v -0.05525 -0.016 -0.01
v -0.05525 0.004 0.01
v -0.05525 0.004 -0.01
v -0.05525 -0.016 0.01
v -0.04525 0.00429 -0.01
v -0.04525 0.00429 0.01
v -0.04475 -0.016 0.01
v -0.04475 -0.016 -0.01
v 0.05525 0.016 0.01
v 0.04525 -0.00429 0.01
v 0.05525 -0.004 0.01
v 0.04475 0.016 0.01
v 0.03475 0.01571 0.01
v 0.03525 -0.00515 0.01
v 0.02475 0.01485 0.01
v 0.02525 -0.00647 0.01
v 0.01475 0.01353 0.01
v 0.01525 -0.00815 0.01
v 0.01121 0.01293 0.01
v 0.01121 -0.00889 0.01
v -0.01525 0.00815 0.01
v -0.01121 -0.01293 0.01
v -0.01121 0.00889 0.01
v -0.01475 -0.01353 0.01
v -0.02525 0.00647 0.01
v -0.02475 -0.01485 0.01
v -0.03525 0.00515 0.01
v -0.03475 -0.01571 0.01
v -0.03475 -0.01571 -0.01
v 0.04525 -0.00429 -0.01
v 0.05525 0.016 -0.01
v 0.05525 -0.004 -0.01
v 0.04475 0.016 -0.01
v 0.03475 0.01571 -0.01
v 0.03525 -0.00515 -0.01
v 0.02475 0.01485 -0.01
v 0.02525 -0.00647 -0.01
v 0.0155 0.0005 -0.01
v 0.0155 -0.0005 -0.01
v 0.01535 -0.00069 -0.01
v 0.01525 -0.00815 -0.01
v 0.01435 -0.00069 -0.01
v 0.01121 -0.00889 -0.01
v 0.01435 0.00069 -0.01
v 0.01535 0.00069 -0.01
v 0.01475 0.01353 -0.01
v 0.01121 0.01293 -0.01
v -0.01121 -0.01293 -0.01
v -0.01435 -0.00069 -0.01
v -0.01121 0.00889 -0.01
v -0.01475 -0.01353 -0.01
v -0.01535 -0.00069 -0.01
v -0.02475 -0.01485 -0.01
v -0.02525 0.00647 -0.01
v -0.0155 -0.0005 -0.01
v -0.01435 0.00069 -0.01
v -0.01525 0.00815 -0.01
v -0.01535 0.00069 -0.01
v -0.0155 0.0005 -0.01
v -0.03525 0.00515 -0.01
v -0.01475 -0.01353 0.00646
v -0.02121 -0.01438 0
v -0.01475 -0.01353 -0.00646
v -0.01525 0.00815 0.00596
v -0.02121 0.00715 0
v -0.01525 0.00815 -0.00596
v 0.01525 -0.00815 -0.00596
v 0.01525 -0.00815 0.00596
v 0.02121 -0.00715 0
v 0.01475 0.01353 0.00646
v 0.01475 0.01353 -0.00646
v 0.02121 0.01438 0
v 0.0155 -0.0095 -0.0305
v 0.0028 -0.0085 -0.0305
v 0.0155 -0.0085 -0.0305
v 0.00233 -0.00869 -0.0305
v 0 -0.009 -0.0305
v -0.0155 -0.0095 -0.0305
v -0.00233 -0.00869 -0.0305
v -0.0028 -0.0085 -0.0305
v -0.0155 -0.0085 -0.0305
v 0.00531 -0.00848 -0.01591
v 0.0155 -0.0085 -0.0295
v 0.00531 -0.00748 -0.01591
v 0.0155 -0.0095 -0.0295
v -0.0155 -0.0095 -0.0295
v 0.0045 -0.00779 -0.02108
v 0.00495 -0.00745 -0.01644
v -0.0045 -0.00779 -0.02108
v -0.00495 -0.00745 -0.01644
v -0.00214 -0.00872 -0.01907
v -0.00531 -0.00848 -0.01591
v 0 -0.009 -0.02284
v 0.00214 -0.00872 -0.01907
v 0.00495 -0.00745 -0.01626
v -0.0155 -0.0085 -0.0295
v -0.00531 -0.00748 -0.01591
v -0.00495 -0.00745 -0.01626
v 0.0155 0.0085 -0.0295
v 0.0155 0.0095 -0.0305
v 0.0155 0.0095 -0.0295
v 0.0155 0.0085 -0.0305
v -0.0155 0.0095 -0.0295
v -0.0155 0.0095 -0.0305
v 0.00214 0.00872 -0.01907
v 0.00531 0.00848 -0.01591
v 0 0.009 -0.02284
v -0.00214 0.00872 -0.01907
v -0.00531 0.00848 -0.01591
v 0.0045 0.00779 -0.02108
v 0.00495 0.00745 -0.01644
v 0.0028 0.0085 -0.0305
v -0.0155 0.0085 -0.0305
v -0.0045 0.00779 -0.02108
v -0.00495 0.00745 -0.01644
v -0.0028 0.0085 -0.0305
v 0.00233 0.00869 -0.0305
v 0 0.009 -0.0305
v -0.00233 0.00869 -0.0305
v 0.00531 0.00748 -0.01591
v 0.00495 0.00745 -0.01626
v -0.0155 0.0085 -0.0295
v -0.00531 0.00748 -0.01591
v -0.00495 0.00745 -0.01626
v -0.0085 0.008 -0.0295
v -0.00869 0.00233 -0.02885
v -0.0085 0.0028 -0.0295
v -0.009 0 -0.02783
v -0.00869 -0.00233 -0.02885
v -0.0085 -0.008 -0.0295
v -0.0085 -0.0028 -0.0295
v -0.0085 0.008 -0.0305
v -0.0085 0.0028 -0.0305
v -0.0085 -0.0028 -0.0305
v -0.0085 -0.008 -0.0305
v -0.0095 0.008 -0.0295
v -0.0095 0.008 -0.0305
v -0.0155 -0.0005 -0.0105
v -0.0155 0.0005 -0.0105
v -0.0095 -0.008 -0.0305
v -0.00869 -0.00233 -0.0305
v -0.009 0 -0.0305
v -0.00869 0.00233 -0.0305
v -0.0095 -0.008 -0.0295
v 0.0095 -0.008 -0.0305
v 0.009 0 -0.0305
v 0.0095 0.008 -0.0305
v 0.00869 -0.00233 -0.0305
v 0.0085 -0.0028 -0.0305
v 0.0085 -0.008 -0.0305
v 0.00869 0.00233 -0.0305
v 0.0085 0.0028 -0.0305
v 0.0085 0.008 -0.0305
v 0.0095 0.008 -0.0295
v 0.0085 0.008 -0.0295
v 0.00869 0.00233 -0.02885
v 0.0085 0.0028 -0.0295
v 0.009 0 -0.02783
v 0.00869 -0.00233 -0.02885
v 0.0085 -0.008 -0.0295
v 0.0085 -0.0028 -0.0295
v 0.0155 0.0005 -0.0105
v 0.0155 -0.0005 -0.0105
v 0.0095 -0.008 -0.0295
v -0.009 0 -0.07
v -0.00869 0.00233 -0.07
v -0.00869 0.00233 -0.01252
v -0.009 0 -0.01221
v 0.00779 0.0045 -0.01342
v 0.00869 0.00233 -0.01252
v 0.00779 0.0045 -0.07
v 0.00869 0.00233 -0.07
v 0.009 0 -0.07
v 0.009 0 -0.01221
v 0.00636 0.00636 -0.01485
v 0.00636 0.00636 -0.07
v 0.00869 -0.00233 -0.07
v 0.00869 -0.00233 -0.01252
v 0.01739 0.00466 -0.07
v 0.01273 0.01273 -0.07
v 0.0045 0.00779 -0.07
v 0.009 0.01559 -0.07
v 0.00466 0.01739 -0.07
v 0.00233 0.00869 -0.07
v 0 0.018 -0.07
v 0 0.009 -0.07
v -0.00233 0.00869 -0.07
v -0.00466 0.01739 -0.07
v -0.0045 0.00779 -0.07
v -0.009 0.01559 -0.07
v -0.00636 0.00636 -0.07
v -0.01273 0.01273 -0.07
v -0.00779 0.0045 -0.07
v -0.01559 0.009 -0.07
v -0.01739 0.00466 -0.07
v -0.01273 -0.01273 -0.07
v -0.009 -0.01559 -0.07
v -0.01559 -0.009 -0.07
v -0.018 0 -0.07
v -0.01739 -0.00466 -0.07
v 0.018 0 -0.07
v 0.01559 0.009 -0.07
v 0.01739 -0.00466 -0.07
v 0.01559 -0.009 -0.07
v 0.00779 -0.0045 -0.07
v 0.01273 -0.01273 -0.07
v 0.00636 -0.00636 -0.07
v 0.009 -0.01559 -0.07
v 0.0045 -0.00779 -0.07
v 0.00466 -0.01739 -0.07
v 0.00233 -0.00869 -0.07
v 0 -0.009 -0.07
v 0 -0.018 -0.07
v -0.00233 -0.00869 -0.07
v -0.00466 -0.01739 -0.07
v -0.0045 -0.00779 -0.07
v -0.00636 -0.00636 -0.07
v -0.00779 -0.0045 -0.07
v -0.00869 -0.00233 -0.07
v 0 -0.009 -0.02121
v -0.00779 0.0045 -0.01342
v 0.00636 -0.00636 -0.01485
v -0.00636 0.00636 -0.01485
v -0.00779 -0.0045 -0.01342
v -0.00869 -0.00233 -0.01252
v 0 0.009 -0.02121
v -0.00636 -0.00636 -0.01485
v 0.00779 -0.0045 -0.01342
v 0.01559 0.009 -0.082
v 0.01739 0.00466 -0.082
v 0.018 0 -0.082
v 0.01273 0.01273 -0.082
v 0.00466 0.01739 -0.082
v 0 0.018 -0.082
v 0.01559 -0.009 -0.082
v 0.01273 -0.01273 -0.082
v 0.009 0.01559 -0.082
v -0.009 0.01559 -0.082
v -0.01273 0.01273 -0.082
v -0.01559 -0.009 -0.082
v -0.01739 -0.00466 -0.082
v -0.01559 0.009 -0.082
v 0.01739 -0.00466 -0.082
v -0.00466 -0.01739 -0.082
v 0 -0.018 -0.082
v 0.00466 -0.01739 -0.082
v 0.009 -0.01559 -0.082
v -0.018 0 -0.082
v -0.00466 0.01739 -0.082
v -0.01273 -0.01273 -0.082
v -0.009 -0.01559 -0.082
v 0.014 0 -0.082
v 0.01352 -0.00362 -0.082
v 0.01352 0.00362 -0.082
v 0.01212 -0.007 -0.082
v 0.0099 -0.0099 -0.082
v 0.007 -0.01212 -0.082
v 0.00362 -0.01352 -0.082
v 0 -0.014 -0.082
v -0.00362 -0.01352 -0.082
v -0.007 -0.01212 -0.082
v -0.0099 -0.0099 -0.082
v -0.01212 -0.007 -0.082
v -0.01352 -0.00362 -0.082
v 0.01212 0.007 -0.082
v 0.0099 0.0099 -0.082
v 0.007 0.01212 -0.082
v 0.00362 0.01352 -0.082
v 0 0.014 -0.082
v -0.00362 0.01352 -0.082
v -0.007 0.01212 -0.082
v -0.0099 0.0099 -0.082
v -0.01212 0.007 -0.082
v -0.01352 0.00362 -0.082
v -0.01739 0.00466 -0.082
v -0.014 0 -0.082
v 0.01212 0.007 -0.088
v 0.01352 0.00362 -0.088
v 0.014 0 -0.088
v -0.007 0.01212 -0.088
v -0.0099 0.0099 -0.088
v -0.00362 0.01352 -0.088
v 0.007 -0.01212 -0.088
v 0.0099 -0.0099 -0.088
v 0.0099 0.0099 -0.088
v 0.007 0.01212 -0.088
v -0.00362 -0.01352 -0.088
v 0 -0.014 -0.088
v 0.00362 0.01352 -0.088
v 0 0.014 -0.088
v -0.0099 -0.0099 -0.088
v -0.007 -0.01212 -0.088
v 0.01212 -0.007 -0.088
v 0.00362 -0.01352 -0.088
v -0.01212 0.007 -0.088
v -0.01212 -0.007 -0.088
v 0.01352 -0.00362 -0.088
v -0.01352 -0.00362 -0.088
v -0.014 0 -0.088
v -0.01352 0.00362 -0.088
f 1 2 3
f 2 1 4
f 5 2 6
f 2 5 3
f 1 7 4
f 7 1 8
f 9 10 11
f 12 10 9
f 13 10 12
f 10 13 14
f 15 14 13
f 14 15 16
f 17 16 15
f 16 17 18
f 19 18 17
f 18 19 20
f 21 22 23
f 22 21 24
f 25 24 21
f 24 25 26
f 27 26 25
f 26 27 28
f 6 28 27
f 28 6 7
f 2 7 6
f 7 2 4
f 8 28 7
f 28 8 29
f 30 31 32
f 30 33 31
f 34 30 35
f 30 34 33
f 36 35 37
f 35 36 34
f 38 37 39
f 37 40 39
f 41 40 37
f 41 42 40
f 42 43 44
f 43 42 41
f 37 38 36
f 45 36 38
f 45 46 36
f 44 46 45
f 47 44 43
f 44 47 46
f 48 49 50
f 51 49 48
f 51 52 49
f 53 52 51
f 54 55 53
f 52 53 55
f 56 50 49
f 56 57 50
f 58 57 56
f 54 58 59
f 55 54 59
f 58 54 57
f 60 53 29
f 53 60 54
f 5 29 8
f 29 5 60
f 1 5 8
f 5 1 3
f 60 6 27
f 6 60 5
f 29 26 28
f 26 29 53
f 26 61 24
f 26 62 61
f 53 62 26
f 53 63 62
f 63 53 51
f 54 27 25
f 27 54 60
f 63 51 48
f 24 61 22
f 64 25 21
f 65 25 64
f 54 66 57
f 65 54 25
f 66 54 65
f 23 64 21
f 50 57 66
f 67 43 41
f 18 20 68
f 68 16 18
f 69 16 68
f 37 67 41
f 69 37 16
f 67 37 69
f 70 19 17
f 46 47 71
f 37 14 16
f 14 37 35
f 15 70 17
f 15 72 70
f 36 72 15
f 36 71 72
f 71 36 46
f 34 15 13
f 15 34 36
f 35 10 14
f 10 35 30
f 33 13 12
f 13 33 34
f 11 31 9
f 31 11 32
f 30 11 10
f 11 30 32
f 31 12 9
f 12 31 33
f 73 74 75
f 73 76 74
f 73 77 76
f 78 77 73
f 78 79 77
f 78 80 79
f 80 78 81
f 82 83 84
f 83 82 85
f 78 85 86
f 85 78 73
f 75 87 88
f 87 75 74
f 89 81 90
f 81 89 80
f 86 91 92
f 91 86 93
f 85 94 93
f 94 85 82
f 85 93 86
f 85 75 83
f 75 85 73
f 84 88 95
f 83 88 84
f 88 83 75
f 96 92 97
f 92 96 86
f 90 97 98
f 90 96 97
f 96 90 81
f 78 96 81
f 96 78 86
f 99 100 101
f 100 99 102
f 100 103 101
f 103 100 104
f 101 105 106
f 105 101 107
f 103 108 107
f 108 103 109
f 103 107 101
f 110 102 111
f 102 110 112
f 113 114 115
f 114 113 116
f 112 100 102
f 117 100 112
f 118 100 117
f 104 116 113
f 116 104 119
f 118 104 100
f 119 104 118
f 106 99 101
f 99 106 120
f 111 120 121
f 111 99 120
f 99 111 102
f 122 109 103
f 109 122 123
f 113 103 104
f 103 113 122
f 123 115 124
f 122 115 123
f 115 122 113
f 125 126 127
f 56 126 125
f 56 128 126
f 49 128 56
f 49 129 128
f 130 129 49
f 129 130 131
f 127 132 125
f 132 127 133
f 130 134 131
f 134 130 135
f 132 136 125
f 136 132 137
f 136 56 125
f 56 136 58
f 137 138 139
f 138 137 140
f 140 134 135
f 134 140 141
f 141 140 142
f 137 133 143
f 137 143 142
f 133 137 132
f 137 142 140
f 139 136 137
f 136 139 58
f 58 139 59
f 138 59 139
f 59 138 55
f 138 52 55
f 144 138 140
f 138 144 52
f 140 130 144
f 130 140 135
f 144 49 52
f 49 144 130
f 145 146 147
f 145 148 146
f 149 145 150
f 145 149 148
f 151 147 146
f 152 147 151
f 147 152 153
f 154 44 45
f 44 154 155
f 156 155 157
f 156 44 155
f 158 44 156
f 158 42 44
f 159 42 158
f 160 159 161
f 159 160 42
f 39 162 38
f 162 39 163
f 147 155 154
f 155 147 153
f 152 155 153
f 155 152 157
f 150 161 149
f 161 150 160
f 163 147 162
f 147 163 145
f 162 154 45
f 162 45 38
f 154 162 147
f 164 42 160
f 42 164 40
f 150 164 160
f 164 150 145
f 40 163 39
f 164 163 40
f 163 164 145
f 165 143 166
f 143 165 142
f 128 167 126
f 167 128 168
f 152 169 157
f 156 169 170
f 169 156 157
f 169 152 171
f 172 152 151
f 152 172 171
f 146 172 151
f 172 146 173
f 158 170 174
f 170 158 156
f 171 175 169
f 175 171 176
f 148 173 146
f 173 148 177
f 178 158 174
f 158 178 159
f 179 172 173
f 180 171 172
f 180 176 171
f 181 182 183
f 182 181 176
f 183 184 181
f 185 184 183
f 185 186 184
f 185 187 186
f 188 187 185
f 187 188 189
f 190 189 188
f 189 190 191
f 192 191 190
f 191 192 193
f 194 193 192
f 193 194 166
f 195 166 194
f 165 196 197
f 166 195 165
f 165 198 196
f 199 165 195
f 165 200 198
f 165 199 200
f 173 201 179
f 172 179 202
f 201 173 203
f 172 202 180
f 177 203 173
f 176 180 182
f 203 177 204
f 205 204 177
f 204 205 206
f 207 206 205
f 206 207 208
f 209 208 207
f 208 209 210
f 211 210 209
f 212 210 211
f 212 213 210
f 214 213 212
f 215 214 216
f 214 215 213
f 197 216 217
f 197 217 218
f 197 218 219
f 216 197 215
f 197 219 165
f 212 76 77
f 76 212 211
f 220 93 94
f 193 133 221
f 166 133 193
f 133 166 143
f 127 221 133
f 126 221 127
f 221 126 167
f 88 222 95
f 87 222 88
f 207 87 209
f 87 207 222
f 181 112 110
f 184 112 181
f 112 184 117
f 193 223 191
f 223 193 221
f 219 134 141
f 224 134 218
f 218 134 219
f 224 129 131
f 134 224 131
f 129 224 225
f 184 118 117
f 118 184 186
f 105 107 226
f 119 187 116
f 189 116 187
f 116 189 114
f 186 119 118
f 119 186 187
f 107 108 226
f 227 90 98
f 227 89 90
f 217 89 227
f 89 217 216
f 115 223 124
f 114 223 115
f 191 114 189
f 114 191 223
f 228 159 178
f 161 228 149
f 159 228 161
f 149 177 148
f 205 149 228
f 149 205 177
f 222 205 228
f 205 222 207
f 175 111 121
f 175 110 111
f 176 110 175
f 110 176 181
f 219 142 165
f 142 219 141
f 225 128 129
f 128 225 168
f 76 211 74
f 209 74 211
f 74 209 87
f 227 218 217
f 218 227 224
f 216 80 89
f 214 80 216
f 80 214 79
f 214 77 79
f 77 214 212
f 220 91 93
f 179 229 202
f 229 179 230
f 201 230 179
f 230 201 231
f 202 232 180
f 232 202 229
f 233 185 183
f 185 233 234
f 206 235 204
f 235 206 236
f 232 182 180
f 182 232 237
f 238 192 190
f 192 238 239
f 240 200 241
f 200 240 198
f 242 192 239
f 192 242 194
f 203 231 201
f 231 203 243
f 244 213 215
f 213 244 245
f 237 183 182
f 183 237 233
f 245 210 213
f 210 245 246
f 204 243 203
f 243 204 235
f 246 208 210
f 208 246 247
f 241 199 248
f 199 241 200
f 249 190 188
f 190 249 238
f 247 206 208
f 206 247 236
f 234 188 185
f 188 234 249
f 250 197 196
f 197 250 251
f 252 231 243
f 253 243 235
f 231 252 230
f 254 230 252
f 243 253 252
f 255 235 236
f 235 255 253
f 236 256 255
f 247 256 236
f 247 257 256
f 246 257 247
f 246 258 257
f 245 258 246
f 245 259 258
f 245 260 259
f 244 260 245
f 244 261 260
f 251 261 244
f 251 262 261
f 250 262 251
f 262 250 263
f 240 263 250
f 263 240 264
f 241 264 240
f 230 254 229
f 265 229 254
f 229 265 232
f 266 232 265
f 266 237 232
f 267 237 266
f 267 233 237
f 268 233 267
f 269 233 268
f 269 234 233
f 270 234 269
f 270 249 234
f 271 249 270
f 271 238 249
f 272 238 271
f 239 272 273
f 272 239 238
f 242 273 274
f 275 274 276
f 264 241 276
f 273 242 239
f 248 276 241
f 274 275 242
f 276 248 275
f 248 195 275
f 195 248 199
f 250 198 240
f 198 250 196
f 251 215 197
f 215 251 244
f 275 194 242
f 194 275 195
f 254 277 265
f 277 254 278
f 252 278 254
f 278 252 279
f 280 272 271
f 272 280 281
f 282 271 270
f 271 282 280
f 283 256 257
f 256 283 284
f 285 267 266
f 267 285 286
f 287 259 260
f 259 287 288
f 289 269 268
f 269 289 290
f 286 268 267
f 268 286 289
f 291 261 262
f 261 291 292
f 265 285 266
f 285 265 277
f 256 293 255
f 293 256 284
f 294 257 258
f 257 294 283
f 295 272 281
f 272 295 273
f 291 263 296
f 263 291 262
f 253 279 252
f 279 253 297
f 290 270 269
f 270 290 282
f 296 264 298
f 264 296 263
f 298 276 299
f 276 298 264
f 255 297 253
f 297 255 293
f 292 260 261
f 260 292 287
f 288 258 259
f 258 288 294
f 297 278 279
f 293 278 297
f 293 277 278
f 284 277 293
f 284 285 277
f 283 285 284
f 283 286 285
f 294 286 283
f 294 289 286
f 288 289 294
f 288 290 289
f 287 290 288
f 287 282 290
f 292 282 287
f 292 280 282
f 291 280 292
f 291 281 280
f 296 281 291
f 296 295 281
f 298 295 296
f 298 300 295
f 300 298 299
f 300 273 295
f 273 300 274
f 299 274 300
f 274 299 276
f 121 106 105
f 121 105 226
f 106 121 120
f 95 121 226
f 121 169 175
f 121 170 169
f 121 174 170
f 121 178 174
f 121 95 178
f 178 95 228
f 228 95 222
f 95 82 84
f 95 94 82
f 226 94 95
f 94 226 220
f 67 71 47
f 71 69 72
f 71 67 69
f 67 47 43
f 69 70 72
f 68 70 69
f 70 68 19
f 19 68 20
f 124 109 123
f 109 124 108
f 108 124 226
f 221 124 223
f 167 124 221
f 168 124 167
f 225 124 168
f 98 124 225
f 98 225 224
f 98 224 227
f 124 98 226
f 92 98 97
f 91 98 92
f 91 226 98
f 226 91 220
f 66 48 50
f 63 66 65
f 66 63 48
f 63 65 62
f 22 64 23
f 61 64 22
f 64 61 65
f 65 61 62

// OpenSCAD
$fn=64;

L = 0.1;
W = 0.02;
H = 0.02;

stem_h = 0.06;
stem_w = 0.018;

base_h = 0.012;
base_r = 0.018;
cap_h  = 0.006;
cap_r  = 0.014;

curve_amp = 0.006;

module diamond_recess(len=0.028, depth=0.004, thick=0.02) {
    rotate([0,45,0])
        cube([len, thick, len], center=true);
}

module grip_segment(x0, x1, y0, y1, z0, z1) {
    hull() {
        translate([x0, y0, z0]) cube([0.001, 0.001, 0.001], center=true);
        translate([x1, y1, z1]) cube([0.001, 0.001, 0.001], center=true);
    }
}

module curved_grip() {
    n = 10;
    union() {
        for (i=[0:n-1]) {
            t0 = i/(n);
            t1 = (i+1)/(n);
            x0 = -L/2 + L*t0;
            x1 = -L/2 + L*t1;
            y0 = curve_amp * sin(180*(t0-0.5));
            y1 = curve_amp * sin(180*(t1-0.5));
            hull() {
                translate([x0, y0, 0]) cube([L/n + 0.0005, W, H], center=true);
                translate([x1, y1, 0]) cube([L/n + 0.0005, W, H], center=true);
            }
        }
    }
}

module faceted_gussets() {
    gus_h = 0.02;
    gus_w = W*0.95;
    gus_l = 0.03;
    union() {
        for (sx=[-1,1]) {
            hull() {
                translate([0, sx*(gus_w/2 - 0.002), -H/2]) cube([0.001, 0.001, 0.001], center=true);
                translate([0, sx*(stem_w/2), -H/2 - gus_h]) cube([0.001, 0.001, 0.001], center=true);
                translate([gus_l/2, sx*(stem_w/2), -H/2 - gus_h]) cube([0.001, 0.001, 0.001], center=true);
            }
            hull() {
                translate([0, sx*(gus_w/2 - 0.002), -H/2]) cube([0.001, 0.001, 0.001], center=true);
                translate([0, sx*(stem_w/2), -H/2 - gus_h]) cube([0.001, 0.001, 0.001], center=true);
                translate([-gus_l/2, sx*(stem_w/2), -H/2 - gus_h]) cube([0.001, 0.001, 0.001], center=true);
            }
        }
        for (sx=[-1,1]) {
            hull() {
                translate([sx*(gus_l/2), 0, -H/2]) cube([0.001, 0.001, 0.001], center=true);
                translate([sx*(stem_w/2), 0, -H/2 - gus_h]) cube([0.001, 0.001, 0.001], center=true);
                translate([sx*(stem_w/2), gus_w/2 - 0.002, -H/2 - gus_h]) cube([0.001, 0.001, 0.001], center=true);
            }
            hull() {
                translate([sx*(gus_l/2), 0, -H/2]) cube([0.001, 0.001, 0.001], center=true);
                translate([sx*(stem_w/2), 0, -H/2 - gus_h]) cube([0.001, 0.001, 0.001], center=true);
                translate([sx*(stem_w/2), -(gus_w/2 - 0.002), -H/2 - gus_h]) cube([0.001, 0.001, 0.001], center=true);
            }
        }
    }
}

module stem_and_base() {
    union() {
        translate([0,0,-H/2 - stem_h/2])
            cylinder(h=stem_h, r=stem_w/2, center=true, $fn=24);
        translate([0,0,-H/2 - stem_h - base_h/2])
            cylinder(h=base_h, r=base_r, center=true, $fn=24);
        translate([0,0,-H/2 - stem_h - base_h - cap_h/2])
            cylinder(h=cap_h, r=cap_r, center=true, $fn=24);
    }
}

module handle() {
    difference() {
        union() {
            curved_grip();
            faceted_gussets();
            stem_and_base();
        }
        translate([0, W/2 + 0.001, 0])
            rotate([0,0,0])
                diamond_recess(len=0.03, depth=0.004, thick=0.03);
        translate([0, -(W/2 + 0.001), 0])
            rotate([0,0,0])
                diamond_recess(len=0.03, depth=0.004, thick=0.03);
    }
}

handle();
